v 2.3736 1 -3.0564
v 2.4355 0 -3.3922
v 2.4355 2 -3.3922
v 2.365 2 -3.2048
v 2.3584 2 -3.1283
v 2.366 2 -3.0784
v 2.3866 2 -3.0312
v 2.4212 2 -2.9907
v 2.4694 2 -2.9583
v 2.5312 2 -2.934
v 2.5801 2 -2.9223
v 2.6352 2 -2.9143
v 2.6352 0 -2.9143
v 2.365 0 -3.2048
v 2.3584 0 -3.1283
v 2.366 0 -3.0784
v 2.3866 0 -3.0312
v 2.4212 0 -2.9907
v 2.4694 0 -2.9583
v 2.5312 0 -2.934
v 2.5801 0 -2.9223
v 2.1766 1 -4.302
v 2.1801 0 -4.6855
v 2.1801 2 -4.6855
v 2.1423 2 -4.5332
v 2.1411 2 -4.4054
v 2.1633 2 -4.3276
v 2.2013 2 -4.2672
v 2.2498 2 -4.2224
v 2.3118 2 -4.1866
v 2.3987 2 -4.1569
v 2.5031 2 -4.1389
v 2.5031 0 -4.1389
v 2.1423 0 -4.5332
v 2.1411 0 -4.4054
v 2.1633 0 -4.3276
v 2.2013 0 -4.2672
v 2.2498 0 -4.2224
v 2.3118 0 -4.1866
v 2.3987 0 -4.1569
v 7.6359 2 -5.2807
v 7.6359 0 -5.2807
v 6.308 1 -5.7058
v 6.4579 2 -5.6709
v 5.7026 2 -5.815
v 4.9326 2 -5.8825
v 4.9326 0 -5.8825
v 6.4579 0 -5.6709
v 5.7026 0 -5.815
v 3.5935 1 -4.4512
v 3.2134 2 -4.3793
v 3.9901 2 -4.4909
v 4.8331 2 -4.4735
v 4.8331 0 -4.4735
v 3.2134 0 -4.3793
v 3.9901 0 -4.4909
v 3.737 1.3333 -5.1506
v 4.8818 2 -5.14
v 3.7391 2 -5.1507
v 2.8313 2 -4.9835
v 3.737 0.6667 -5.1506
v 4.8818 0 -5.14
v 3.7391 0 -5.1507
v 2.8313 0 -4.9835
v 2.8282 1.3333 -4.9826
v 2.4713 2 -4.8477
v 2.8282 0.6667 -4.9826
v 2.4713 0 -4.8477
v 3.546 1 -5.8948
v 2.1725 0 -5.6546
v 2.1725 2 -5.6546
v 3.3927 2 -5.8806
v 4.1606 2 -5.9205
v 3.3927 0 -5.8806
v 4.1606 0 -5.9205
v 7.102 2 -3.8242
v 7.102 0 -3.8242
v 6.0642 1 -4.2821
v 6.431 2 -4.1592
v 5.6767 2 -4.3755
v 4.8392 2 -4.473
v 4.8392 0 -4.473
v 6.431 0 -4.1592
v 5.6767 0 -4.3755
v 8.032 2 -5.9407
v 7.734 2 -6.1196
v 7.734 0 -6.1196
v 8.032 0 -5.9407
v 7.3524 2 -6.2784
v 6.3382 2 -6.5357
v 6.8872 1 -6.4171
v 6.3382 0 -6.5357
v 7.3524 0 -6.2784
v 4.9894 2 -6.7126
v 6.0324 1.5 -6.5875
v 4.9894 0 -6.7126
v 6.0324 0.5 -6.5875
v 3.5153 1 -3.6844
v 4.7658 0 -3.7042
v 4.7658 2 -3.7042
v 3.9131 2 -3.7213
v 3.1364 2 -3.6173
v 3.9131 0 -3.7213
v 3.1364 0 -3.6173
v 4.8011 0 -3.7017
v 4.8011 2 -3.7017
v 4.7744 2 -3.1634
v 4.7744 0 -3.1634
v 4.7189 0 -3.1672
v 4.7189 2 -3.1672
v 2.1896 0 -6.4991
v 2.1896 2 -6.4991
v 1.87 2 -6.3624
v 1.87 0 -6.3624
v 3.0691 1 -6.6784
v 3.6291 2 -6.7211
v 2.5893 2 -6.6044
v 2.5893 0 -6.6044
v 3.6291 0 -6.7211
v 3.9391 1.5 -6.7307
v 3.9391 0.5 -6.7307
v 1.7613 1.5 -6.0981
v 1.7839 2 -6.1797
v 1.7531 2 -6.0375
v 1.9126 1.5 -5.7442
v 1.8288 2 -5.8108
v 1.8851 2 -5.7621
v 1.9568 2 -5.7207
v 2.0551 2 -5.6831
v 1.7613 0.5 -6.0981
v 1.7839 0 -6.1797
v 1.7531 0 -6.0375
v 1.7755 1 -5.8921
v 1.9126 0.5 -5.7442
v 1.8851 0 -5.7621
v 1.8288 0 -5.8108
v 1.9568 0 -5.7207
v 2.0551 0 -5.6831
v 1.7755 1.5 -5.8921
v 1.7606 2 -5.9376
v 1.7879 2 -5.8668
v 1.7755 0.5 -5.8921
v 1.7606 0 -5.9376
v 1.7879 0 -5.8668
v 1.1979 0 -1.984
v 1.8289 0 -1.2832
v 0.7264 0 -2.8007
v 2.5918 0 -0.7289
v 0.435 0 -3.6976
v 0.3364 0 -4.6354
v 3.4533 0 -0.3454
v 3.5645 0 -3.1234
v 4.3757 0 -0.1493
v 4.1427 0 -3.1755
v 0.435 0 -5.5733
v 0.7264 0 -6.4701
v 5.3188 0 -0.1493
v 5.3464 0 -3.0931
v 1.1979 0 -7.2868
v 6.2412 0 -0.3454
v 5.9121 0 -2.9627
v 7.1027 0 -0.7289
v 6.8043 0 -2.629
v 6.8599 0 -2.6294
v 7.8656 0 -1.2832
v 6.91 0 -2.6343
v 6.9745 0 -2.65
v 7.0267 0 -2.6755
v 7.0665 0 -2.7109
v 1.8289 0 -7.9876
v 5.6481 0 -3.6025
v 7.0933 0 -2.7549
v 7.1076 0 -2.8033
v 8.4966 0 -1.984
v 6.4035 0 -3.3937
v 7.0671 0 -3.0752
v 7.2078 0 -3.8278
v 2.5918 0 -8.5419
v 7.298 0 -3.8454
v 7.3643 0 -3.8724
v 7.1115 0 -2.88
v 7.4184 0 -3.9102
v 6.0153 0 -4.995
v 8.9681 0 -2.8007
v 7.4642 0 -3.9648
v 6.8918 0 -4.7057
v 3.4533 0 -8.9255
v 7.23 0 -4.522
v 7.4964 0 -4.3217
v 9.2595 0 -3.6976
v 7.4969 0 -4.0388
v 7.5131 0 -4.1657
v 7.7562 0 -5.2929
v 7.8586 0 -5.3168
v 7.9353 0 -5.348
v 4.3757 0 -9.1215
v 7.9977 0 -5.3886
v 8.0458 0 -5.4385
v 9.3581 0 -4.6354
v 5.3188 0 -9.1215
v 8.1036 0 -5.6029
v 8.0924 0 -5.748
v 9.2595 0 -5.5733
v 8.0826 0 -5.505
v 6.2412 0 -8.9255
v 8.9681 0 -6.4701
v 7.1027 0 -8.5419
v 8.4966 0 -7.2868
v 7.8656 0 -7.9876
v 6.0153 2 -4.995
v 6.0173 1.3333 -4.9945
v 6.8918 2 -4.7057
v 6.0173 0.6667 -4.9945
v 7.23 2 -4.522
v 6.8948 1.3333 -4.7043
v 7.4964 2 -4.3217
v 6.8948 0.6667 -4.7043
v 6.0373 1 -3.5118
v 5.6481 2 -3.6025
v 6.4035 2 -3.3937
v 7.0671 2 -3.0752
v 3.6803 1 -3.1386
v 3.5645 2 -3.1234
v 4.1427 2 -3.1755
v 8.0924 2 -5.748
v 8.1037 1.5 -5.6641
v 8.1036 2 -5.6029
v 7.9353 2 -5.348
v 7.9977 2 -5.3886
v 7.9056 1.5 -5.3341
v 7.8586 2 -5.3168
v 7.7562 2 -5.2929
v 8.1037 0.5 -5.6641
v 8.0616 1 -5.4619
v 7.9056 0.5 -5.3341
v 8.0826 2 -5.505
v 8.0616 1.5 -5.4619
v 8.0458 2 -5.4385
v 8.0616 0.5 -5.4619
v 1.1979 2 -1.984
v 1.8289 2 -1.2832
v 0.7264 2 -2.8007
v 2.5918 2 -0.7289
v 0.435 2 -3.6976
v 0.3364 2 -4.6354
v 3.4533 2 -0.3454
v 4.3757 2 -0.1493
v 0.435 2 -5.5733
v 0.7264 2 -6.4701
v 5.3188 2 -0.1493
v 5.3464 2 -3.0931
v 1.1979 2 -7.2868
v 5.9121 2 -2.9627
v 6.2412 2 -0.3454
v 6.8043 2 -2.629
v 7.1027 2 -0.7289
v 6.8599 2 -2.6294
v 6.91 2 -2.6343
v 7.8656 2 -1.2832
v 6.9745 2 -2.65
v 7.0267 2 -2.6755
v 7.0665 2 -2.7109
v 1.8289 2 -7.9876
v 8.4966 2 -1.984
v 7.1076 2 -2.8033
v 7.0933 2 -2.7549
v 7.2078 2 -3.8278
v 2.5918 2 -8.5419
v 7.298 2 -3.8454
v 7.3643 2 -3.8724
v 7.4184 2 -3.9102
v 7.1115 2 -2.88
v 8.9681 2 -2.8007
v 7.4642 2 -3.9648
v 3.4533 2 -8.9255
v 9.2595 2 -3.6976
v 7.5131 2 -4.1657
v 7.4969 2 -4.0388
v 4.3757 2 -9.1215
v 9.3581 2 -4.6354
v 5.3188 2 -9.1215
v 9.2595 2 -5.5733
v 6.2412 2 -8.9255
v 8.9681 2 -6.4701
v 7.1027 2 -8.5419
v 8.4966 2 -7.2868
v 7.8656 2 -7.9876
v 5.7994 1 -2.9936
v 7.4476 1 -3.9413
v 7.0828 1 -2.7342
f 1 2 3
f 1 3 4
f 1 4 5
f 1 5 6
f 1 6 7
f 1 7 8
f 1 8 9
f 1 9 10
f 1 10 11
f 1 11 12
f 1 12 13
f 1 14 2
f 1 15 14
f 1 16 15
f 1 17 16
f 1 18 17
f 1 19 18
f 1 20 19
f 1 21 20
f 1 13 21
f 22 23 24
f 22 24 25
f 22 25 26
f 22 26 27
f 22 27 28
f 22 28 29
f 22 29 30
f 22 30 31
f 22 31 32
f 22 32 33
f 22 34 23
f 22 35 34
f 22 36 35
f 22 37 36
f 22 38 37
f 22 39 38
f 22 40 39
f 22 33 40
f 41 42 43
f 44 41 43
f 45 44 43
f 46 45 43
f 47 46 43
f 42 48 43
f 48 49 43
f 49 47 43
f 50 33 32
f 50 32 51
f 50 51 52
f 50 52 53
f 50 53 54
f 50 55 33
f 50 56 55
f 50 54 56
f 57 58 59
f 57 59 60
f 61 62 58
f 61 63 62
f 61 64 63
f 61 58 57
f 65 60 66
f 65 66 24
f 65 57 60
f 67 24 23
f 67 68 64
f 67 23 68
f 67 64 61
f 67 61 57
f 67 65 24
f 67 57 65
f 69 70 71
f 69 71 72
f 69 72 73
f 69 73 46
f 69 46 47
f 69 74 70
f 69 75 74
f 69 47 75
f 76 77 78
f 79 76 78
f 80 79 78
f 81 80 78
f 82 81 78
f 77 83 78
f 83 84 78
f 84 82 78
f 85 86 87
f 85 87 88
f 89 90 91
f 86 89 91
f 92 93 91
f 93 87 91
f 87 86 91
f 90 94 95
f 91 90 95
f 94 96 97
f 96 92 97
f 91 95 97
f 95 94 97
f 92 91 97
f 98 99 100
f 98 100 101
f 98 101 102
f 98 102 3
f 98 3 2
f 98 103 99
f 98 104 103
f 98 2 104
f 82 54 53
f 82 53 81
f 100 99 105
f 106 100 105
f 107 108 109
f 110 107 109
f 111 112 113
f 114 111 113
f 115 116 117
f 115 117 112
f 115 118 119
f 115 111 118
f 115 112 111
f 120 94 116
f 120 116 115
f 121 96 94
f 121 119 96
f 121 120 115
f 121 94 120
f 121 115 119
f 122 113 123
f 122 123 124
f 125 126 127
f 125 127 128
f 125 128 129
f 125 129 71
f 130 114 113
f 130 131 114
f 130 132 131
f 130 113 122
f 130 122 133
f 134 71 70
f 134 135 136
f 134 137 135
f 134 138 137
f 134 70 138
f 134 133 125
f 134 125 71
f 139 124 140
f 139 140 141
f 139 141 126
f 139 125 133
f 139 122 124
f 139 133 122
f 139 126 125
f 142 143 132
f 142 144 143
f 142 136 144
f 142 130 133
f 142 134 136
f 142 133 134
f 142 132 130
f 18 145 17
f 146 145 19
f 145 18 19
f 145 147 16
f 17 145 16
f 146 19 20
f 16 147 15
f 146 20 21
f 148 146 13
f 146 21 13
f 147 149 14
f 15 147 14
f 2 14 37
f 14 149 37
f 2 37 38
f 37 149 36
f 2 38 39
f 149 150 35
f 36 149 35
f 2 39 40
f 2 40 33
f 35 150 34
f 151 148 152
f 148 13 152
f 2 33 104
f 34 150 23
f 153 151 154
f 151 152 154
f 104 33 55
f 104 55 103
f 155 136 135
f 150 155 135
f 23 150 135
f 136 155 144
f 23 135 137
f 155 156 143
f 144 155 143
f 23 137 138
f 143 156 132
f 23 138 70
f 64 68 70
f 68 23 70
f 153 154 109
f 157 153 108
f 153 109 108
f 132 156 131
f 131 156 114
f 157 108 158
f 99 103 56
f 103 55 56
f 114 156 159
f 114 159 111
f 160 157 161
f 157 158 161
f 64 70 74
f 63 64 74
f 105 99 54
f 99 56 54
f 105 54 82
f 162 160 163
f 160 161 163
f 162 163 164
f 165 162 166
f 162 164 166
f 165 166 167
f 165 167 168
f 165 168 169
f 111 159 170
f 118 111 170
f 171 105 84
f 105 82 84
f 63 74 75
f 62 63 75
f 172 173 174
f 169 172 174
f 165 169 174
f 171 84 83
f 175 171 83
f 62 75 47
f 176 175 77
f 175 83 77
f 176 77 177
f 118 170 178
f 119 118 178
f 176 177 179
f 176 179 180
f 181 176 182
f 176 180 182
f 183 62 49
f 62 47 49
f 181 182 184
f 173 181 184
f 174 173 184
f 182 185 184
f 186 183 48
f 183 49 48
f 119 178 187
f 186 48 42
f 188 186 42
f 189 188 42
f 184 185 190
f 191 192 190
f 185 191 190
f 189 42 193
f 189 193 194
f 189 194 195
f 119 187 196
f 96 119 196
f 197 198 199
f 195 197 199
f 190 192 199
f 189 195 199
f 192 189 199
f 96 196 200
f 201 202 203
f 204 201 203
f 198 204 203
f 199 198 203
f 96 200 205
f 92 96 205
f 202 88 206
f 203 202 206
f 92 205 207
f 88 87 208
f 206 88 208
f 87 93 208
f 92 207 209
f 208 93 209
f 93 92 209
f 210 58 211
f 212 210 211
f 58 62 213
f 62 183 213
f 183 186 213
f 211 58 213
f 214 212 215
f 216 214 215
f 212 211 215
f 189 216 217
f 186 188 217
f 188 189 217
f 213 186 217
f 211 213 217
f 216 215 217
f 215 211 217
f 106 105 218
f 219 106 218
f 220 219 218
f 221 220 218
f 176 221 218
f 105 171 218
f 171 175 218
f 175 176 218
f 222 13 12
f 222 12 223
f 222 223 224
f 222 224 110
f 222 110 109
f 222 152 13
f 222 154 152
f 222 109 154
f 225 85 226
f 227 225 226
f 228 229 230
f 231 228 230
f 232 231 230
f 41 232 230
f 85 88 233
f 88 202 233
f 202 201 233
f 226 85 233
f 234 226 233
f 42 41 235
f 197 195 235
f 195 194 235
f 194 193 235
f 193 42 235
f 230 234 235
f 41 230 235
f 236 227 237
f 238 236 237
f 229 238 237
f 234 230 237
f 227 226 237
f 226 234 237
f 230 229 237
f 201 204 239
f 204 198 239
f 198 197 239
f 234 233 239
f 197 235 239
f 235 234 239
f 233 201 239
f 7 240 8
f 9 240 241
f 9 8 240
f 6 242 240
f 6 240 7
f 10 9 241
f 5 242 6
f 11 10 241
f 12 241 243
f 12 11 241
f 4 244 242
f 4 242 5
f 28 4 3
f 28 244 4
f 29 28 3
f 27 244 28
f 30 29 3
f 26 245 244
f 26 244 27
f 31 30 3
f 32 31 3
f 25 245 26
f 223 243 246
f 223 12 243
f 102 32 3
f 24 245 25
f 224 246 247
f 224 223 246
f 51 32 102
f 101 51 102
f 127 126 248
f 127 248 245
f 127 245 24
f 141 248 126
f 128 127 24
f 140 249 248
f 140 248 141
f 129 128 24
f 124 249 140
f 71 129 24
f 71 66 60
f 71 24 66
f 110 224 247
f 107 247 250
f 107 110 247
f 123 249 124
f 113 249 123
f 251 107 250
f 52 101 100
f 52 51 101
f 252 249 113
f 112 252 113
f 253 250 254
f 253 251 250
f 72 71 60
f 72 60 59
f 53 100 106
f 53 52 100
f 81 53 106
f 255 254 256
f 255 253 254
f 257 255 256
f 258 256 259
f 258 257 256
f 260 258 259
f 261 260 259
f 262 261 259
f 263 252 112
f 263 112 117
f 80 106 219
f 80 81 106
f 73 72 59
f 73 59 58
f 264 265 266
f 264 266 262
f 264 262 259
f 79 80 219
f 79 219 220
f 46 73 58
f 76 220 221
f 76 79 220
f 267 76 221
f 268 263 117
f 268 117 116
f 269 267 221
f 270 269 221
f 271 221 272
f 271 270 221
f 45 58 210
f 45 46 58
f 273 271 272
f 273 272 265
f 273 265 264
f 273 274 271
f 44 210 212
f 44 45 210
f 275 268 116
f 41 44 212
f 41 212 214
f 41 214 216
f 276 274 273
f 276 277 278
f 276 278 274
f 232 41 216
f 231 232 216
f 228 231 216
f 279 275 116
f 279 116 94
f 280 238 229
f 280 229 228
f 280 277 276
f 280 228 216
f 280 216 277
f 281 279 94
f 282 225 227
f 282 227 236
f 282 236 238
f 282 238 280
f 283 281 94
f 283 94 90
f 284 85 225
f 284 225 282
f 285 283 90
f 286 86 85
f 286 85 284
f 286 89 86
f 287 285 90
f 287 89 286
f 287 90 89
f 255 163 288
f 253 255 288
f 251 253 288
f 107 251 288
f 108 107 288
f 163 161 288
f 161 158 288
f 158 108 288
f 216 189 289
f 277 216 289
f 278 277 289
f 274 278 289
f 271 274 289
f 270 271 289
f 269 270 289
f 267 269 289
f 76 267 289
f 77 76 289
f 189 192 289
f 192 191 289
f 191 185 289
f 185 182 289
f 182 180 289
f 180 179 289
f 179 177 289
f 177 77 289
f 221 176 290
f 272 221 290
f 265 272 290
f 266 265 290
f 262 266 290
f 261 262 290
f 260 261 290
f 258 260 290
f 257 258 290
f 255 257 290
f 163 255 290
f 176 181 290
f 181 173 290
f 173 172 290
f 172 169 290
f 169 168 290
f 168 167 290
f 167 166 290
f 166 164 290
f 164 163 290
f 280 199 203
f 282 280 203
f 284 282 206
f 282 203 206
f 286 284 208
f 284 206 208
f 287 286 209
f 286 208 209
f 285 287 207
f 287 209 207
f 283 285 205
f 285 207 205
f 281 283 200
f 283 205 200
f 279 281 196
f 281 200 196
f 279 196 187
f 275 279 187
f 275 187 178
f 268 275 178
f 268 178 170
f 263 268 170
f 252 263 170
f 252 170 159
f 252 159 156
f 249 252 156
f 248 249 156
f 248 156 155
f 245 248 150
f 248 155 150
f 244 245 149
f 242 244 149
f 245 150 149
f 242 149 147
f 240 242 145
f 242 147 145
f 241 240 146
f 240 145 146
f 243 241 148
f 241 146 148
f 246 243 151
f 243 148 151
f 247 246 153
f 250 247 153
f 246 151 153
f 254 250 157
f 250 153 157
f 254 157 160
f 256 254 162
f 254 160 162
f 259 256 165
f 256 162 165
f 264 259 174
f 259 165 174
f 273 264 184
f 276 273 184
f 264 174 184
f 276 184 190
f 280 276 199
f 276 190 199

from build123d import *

# Parameters (mm, degrees)
SKETCH1_R           = 4.510832166
BOSS_EXTRUDE1_DEPTH = 2


with BuildPart() as part:
    # Sketch1 → Boss-Extrude1 (new body)
    with BuildSketch(Plane(origin=(0, 0, 0), x_dir=(1, 0, 0), z_dir=(0, 1, 0))):
        with Locations((4.847257792, 4.635414513)):
            Circle(SKETCH1_R)
        with BuildLine():
            Line((4.765839993, 3.704152946), (4.801053978, 3.701743172))
            add(Edge.make_bspline(
                [(4.801053978, 3.701743172), (6.14048774, 3.63517676), (7.067136471, 3.075228485)],
                knots=[0, 0, 0, 1, 1, 1], degree=2))
            add(Edge.make_bspline(
                [(7.067136471, 3.075228485), (7.229894904, 2.616221828), (6.804254242, 2.628959028)],
                knots=[0, 0, 0, 1, 1, 1], degree=2))
            add(Edge.make_bspline(
                [(6.804254242, 2.628959028), (5.8095543, 3.091031812), (4.77441326, 3.163396408)],
                knots=[0, 0, 0, 1, 1, 1], degree=2))
            Line((4.77441326, 3.163396408), (4.718895199, 3.167195635))
            add(Edge.make_bspline(
                [(2.635172404, 2.914258811), (3.683546068, 3.236519406), (4.718895199, 3.167195635)],
                knots=[0, 0, 0, 1, 1, 1], degree=2))
            add(Edge.make_bspline(
                [(2.43553462, 3.392179568), (2.211764545, 2.959623939), (2.635172404, 2.914258811)],
                knots=[0, 0, 0, 1, 1, 1], degree=2))
            add(Edge.make_bspline(
                [(4.765839993, 3.704152946), (3.429824714, 3.820673616), (2.43553462, 3.392179568)],
                knots=[0, 0, 0, 1, 1, 1], degree=2))
        make_face(mode=Mode.SUBTRACT)
        with BuildLine():
            Line((4.833097784, 4.473451505), (4.839222124, 4.473032403))
            add(Edge.make_bspline(
                [(7.101962805, 3.824170948), (6.157905723, 4.415694672), (4.839222124, 4.473032403)],
                knots=[0, 0, 0, 1, 1, 1], degree=2))
            add(Edge.make_bspline(
                [(7.496384151, 4.321712857), (7.596066747, 3.809653625), (7.101962805, 3.824170948)],
                knots=[0, 0, 0, 1, 1, 1], degree=2))
            add(Edge.make_bspline(
                [(4.881790421, 5.14003934), (6.140415114, 5.08430185), (7.038587479, 4.73304729), (7.496384151, 4.321712857)],
                knots=[0, 0, 0, 0, 1, 1, 1, 1], degree=3))
            add(Edge.make_bspline(
                [(4.881790421, 5.14003934), (3.627306072, 5.256279636), (2.689656518, 5.030654558), (2.180092864, 4.6855188)],
                knots=[0, 0, 0, 0, 1, 1, 1, 1], degree=3))
            add(Edge.make_bspline(
                [(2.180092864, 4.6855188), (2.011583443, 4.19181256), (2.503058846, 4.138884439)],
                knots=[0, 0, 0, 1, 1, 1], degree=2))
            add(Edge.make_bspline(
                [(2.503058846, 4.138884439), (3.518896422, 4.5962881), (4.833097784, 4.473451505)],
                knots=[0, 0, 0, 1, 1, 1], degree=2))
        make_face(mode=Mode.SUBTRACT)
        with BuildLine():
            add(Edge.make_bspline(
                [(4.98940547, 6.712616582), (2.708473933, 6.819328215), (1.870039434, 6.362412541)],
                knots=[0, 0, 0, 1, 1, 1], degree=2))
            add(Edge.make_bspline(
                [(1.870039434, 6.362412541), (1.529749193, 5.775598177), (2.172520926, 5.654605851)],
                knots=[0, 0, 0, 1, 1, 1], degree=2))
            add(Edge.make_bspline(
                [(2.172520926, 5.654605851), (3.539396322, 6.021113127), (4.93259631, 5.882465099)],
                knots=[0, 0, 0, 1, 1, 1], degree=2))
            add(Edge.make_bspline(
                [(7.635900953, 5.28073429), (6.331696023, 5.830029687), (4.93259631, 5.882465099)],
                knots=[0, 0, 0, 1, 1, 1], degree=2))
            add(Edge.make_bspline(
                [(8.031984733, 5.940736564), (8.289162951, 5.31303607), (7.635900953, 5.28073429)],
                knots=[0, 0, 0, 1, 1, 1], degree=2))
            add(Edge.make_bspline(
                [(4.98940547, 6.712616582), (7.263610448, 6.507609829), (8.031984733, 5.940736564)],
                knots=[0, 0, 0, 1, 1, 1], degree=2))
        make_face(mode=Mode.SUBTRACT)
    extrude(amount=BOSS_EXTRUDE1_DEPTH)


solid = part.part
